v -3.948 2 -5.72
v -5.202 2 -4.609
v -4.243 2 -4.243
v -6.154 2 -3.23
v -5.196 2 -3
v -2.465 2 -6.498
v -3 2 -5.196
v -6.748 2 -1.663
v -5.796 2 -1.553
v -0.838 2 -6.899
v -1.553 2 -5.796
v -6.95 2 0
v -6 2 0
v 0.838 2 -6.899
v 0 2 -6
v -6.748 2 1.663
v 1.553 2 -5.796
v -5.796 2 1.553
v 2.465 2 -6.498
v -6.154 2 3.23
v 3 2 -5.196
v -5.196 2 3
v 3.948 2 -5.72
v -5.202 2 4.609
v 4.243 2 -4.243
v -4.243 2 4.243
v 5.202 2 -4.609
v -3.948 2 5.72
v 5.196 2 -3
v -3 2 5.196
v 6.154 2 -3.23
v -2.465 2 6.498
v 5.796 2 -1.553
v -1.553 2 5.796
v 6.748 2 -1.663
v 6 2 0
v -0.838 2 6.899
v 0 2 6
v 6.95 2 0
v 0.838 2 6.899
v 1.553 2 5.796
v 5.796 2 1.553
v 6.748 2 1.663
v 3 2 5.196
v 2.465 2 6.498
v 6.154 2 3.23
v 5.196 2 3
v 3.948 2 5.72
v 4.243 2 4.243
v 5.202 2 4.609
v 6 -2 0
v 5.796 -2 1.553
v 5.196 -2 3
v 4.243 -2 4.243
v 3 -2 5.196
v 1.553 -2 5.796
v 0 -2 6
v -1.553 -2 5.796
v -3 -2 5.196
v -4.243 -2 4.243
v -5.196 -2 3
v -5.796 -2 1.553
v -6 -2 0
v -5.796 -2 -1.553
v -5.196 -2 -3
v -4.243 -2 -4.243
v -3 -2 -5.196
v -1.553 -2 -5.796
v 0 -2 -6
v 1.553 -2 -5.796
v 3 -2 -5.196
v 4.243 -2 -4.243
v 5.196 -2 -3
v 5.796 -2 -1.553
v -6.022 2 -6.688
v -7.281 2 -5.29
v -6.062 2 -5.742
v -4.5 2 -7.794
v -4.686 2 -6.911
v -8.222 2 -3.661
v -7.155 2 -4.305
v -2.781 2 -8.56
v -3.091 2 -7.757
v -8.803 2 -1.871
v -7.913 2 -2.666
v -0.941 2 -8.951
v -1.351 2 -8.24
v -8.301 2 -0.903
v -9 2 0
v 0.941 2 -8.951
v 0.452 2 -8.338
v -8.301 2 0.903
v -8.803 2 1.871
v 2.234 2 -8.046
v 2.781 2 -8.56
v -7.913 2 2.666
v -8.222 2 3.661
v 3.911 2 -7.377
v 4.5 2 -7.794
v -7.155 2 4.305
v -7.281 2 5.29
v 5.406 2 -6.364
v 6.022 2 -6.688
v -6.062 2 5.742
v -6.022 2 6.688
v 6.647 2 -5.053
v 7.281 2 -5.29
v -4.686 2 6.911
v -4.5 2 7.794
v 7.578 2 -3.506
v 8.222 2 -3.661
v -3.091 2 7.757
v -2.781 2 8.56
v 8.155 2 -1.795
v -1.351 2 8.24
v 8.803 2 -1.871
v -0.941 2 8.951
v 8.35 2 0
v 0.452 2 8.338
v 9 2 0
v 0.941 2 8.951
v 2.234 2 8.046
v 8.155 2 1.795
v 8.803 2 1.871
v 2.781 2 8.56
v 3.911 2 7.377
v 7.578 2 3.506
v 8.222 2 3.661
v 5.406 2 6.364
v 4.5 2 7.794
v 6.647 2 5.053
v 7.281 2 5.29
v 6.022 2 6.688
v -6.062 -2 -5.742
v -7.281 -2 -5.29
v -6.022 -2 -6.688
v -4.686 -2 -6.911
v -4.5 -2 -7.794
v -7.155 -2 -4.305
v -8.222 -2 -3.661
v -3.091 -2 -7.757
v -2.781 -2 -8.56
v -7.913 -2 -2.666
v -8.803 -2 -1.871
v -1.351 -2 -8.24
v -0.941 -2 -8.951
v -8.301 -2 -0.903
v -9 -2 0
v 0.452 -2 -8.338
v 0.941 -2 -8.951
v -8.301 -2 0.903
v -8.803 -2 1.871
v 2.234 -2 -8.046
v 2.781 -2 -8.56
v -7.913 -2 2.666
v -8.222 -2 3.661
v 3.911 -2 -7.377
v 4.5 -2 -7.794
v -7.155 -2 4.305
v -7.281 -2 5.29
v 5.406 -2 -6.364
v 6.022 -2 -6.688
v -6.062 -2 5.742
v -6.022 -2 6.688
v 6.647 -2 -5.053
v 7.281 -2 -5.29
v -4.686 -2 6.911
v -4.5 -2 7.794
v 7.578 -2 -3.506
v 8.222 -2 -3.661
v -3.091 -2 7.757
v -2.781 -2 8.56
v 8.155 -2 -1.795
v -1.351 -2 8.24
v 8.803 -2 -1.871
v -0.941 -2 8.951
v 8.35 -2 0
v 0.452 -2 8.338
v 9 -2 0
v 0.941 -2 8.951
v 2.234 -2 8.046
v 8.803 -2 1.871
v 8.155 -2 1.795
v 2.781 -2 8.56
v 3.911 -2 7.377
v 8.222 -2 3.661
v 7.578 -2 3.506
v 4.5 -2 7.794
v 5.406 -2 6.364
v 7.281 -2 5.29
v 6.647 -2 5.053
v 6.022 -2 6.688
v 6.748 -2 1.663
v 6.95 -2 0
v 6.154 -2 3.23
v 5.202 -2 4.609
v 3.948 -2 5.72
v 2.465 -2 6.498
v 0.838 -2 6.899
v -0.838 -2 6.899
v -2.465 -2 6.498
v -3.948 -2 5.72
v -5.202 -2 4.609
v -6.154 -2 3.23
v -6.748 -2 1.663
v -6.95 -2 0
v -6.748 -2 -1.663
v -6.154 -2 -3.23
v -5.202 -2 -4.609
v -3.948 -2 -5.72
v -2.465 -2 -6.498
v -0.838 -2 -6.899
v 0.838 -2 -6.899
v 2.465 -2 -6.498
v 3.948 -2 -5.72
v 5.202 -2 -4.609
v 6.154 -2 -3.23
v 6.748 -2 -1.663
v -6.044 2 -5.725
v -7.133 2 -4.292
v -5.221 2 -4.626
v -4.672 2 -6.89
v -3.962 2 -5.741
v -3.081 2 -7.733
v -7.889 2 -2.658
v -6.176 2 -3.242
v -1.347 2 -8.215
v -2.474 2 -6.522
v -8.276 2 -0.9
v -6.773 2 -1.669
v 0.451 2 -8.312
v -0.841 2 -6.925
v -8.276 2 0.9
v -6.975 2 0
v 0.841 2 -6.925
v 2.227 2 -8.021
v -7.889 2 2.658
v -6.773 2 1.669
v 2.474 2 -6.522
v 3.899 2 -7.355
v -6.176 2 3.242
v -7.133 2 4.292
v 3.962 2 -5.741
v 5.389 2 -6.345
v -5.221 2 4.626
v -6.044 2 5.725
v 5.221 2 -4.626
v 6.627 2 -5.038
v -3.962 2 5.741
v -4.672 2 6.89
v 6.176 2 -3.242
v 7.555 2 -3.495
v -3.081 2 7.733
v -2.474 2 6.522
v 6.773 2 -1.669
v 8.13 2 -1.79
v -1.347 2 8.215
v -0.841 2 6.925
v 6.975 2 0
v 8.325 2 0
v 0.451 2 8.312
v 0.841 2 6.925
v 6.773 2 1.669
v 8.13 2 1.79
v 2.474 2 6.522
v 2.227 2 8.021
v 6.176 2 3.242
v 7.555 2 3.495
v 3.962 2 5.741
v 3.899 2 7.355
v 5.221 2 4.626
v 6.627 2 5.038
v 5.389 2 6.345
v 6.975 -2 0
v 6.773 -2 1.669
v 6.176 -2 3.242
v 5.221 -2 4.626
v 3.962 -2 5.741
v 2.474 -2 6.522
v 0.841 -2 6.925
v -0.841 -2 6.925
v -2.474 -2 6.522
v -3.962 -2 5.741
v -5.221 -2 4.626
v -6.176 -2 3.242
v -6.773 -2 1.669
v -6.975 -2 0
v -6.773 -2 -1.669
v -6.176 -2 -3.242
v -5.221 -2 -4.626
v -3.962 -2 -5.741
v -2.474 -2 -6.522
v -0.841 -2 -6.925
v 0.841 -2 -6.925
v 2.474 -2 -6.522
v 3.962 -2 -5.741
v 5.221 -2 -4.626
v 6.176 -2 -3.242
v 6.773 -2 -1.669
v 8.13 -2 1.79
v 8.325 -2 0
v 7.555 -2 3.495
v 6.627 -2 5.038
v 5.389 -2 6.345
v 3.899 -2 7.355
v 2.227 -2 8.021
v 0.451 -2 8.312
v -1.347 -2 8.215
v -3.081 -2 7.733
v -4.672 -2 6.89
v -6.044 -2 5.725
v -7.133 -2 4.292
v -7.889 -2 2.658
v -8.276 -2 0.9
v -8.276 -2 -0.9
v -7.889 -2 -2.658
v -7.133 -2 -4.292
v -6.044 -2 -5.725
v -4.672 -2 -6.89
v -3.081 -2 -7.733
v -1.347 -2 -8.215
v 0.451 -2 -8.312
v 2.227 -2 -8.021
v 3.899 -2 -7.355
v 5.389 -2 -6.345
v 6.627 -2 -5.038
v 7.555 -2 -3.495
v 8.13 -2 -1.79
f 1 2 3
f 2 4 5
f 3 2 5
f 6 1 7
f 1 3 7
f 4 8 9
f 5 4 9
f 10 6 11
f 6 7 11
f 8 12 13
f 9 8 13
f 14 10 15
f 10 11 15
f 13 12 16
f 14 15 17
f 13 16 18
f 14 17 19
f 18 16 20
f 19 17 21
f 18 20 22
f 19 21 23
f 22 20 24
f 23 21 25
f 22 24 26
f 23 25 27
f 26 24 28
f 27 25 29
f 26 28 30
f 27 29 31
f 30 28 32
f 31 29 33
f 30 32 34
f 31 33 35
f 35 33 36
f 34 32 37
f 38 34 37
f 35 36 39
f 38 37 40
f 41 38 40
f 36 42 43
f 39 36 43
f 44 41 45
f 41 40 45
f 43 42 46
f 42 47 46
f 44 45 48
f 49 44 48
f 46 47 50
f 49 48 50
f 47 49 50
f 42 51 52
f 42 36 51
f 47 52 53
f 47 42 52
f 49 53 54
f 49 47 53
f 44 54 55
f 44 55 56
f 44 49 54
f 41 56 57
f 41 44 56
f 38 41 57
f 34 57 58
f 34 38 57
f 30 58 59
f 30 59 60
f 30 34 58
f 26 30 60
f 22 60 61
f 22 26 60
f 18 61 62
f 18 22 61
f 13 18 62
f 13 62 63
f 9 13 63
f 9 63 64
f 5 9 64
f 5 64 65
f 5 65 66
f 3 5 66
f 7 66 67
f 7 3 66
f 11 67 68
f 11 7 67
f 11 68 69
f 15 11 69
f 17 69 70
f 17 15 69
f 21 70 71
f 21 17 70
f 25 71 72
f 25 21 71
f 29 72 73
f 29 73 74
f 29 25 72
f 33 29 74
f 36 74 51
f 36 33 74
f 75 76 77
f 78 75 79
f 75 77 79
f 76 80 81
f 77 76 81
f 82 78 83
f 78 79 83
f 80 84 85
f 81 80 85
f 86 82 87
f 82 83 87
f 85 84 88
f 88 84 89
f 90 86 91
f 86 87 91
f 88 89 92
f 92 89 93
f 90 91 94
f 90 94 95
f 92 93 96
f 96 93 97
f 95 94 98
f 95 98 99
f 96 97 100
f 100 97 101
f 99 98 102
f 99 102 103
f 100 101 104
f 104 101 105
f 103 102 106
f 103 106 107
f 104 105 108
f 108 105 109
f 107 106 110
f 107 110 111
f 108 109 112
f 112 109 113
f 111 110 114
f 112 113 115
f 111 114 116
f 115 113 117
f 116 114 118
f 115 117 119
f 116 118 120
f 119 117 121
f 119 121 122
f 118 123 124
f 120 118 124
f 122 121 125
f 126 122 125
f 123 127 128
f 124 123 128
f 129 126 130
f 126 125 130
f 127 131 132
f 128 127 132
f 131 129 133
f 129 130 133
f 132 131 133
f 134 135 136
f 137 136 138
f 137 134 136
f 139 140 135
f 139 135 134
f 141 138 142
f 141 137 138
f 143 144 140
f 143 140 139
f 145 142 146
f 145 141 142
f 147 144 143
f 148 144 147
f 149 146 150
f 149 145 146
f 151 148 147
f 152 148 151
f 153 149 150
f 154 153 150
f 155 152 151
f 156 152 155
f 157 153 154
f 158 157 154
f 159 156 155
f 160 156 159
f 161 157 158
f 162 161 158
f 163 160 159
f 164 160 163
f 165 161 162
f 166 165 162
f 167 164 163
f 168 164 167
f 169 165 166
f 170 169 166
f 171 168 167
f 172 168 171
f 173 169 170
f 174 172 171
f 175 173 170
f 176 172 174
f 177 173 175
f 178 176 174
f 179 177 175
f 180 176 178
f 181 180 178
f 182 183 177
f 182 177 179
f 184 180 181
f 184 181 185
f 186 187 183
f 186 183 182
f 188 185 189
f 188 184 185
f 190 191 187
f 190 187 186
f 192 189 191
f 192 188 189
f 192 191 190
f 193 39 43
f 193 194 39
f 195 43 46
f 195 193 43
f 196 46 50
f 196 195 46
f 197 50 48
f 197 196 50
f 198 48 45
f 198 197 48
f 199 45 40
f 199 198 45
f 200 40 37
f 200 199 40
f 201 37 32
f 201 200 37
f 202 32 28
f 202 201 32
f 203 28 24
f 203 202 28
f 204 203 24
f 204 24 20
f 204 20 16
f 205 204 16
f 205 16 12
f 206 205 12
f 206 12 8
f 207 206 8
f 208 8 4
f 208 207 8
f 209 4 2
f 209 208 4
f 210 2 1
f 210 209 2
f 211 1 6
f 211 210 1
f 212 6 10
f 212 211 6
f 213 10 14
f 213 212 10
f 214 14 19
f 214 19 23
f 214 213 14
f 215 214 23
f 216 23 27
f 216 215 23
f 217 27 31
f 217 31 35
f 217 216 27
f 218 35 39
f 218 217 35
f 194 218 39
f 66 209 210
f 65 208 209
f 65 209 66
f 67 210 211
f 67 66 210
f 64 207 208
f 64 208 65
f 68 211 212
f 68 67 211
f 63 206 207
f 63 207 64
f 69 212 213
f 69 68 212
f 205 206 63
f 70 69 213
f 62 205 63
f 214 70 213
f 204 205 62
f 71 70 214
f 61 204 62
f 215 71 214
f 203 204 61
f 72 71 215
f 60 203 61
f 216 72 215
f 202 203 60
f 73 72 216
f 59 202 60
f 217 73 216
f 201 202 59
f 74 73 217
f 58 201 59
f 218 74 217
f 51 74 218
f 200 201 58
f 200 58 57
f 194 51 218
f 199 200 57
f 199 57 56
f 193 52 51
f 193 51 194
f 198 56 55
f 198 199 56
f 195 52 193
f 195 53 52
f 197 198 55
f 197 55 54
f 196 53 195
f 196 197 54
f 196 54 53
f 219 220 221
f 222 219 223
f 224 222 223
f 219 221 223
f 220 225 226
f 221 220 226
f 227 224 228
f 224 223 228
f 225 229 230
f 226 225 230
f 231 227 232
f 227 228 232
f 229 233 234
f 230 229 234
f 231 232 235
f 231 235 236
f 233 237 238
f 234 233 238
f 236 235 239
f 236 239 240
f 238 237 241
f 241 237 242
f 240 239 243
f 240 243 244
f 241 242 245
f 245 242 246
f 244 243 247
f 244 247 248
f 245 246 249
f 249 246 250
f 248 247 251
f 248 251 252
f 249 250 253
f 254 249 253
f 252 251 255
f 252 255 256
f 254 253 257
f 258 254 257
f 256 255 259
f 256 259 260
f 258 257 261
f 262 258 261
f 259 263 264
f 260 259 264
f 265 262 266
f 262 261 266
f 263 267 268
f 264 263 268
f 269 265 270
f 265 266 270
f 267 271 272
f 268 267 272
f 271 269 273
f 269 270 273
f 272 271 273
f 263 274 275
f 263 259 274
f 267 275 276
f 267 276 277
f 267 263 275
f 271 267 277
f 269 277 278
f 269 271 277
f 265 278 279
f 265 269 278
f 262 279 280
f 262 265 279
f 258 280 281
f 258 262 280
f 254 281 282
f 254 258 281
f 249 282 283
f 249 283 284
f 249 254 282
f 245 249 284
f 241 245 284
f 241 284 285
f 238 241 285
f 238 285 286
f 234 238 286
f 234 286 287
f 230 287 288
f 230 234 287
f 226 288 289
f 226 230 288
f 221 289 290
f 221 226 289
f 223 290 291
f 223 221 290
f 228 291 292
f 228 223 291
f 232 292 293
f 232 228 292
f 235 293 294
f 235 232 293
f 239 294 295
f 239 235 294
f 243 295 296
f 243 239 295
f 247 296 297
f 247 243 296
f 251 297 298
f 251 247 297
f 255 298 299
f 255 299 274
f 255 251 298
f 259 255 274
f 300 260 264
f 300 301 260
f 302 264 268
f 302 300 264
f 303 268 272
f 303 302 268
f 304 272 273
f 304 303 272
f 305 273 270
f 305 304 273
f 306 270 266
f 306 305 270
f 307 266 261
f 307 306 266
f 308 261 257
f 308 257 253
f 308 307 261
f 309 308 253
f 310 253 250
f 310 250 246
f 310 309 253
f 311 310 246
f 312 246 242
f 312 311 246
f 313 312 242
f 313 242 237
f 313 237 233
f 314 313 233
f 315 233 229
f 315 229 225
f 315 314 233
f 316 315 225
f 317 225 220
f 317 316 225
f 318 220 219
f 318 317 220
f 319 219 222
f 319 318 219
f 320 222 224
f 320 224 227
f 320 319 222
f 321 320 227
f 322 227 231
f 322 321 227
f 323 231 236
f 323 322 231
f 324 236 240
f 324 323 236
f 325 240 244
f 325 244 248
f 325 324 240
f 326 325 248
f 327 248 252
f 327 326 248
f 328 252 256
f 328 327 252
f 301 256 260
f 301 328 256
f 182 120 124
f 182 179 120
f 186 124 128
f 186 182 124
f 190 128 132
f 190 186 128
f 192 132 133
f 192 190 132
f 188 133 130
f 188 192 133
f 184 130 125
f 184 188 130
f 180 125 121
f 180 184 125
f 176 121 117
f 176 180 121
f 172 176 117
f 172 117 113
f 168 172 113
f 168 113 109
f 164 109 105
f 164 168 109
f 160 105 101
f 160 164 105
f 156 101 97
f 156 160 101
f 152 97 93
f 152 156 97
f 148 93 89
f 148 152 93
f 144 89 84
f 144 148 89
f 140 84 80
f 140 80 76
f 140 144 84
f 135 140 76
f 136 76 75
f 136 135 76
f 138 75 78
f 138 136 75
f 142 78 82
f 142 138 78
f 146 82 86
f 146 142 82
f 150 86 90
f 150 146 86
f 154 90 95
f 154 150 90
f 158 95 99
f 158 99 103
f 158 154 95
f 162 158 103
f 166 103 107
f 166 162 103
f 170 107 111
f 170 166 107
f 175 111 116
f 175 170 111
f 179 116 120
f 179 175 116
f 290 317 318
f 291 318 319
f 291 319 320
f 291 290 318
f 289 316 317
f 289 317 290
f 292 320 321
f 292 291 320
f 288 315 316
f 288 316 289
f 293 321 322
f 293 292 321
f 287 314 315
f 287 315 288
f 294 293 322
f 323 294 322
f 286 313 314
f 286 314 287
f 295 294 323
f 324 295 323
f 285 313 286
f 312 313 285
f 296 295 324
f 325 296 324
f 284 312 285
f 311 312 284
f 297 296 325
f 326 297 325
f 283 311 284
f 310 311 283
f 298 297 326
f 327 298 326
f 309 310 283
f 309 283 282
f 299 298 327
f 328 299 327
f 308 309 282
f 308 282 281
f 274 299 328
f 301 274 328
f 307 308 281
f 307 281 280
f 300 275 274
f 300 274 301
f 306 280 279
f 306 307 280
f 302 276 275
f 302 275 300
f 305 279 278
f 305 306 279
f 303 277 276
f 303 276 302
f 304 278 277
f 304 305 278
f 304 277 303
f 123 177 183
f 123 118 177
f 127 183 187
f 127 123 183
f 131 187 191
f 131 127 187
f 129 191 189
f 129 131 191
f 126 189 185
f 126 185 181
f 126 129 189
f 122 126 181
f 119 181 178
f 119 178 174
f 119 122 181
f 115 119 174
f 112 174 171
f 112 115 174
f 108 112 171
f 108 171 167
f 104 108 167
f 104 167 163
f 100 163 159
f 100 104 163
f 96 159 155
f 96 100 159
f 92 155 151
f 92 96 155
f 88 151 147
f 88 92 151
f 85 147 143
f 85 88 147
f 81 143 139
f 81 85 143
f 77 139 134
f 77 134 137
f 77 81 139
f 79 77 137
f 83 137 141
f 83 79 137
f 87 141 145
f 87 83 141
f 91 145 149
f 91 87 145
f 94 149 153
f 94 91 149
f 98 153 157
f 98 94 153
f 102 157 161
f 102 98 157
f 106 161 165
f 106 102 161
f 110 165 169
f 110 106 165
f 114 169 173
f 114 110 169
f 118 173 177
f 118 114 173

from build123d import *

# Parameters (mm, degrees)
F0_R     = 9
F0_R_2   = 8.35
F1_DEPTH = 2
F0_R_3   = 6.95
F0_R_4   = 6
F2_DEPTH = 2
F3_R     = 8.3246
F3_R_2   = 6.9754
F4_DEPTH = 2


with BuildPart() as f1:
    # F0 (on Front) → F1 (new body, symmetric)
    with BuildSketch(Plane.XZ):
        Circle(F0_R)
        Circle(F0_R_2, mode=Mode.SUBTRACT)
    extrude(amount=F1_DEPTH, both=True)


with BuildPart() as f2:
    # F0 (on Front) → F2 (new body, symmetric)
    with BuildSketch(Plane.XZ):
        Circle(F0_R_3)
        Circle(F0_R_4, mode=Mode.SUBTRACT)
    extrude(amount=F2_DEPTH, both=True)


with BuildPart() as f4:
    # F3 (on Front) → F4 (new body, symmetric)
    with BuildSketch(Plane.XZ):
        Circle(F3_R)
        Circle(F3_R_2, mode=Mode.SUBTRACT)
    extrude(amount=F4_DEPTH, both=True)


solid = Compound([f1.part, f2.part, f4.part])
